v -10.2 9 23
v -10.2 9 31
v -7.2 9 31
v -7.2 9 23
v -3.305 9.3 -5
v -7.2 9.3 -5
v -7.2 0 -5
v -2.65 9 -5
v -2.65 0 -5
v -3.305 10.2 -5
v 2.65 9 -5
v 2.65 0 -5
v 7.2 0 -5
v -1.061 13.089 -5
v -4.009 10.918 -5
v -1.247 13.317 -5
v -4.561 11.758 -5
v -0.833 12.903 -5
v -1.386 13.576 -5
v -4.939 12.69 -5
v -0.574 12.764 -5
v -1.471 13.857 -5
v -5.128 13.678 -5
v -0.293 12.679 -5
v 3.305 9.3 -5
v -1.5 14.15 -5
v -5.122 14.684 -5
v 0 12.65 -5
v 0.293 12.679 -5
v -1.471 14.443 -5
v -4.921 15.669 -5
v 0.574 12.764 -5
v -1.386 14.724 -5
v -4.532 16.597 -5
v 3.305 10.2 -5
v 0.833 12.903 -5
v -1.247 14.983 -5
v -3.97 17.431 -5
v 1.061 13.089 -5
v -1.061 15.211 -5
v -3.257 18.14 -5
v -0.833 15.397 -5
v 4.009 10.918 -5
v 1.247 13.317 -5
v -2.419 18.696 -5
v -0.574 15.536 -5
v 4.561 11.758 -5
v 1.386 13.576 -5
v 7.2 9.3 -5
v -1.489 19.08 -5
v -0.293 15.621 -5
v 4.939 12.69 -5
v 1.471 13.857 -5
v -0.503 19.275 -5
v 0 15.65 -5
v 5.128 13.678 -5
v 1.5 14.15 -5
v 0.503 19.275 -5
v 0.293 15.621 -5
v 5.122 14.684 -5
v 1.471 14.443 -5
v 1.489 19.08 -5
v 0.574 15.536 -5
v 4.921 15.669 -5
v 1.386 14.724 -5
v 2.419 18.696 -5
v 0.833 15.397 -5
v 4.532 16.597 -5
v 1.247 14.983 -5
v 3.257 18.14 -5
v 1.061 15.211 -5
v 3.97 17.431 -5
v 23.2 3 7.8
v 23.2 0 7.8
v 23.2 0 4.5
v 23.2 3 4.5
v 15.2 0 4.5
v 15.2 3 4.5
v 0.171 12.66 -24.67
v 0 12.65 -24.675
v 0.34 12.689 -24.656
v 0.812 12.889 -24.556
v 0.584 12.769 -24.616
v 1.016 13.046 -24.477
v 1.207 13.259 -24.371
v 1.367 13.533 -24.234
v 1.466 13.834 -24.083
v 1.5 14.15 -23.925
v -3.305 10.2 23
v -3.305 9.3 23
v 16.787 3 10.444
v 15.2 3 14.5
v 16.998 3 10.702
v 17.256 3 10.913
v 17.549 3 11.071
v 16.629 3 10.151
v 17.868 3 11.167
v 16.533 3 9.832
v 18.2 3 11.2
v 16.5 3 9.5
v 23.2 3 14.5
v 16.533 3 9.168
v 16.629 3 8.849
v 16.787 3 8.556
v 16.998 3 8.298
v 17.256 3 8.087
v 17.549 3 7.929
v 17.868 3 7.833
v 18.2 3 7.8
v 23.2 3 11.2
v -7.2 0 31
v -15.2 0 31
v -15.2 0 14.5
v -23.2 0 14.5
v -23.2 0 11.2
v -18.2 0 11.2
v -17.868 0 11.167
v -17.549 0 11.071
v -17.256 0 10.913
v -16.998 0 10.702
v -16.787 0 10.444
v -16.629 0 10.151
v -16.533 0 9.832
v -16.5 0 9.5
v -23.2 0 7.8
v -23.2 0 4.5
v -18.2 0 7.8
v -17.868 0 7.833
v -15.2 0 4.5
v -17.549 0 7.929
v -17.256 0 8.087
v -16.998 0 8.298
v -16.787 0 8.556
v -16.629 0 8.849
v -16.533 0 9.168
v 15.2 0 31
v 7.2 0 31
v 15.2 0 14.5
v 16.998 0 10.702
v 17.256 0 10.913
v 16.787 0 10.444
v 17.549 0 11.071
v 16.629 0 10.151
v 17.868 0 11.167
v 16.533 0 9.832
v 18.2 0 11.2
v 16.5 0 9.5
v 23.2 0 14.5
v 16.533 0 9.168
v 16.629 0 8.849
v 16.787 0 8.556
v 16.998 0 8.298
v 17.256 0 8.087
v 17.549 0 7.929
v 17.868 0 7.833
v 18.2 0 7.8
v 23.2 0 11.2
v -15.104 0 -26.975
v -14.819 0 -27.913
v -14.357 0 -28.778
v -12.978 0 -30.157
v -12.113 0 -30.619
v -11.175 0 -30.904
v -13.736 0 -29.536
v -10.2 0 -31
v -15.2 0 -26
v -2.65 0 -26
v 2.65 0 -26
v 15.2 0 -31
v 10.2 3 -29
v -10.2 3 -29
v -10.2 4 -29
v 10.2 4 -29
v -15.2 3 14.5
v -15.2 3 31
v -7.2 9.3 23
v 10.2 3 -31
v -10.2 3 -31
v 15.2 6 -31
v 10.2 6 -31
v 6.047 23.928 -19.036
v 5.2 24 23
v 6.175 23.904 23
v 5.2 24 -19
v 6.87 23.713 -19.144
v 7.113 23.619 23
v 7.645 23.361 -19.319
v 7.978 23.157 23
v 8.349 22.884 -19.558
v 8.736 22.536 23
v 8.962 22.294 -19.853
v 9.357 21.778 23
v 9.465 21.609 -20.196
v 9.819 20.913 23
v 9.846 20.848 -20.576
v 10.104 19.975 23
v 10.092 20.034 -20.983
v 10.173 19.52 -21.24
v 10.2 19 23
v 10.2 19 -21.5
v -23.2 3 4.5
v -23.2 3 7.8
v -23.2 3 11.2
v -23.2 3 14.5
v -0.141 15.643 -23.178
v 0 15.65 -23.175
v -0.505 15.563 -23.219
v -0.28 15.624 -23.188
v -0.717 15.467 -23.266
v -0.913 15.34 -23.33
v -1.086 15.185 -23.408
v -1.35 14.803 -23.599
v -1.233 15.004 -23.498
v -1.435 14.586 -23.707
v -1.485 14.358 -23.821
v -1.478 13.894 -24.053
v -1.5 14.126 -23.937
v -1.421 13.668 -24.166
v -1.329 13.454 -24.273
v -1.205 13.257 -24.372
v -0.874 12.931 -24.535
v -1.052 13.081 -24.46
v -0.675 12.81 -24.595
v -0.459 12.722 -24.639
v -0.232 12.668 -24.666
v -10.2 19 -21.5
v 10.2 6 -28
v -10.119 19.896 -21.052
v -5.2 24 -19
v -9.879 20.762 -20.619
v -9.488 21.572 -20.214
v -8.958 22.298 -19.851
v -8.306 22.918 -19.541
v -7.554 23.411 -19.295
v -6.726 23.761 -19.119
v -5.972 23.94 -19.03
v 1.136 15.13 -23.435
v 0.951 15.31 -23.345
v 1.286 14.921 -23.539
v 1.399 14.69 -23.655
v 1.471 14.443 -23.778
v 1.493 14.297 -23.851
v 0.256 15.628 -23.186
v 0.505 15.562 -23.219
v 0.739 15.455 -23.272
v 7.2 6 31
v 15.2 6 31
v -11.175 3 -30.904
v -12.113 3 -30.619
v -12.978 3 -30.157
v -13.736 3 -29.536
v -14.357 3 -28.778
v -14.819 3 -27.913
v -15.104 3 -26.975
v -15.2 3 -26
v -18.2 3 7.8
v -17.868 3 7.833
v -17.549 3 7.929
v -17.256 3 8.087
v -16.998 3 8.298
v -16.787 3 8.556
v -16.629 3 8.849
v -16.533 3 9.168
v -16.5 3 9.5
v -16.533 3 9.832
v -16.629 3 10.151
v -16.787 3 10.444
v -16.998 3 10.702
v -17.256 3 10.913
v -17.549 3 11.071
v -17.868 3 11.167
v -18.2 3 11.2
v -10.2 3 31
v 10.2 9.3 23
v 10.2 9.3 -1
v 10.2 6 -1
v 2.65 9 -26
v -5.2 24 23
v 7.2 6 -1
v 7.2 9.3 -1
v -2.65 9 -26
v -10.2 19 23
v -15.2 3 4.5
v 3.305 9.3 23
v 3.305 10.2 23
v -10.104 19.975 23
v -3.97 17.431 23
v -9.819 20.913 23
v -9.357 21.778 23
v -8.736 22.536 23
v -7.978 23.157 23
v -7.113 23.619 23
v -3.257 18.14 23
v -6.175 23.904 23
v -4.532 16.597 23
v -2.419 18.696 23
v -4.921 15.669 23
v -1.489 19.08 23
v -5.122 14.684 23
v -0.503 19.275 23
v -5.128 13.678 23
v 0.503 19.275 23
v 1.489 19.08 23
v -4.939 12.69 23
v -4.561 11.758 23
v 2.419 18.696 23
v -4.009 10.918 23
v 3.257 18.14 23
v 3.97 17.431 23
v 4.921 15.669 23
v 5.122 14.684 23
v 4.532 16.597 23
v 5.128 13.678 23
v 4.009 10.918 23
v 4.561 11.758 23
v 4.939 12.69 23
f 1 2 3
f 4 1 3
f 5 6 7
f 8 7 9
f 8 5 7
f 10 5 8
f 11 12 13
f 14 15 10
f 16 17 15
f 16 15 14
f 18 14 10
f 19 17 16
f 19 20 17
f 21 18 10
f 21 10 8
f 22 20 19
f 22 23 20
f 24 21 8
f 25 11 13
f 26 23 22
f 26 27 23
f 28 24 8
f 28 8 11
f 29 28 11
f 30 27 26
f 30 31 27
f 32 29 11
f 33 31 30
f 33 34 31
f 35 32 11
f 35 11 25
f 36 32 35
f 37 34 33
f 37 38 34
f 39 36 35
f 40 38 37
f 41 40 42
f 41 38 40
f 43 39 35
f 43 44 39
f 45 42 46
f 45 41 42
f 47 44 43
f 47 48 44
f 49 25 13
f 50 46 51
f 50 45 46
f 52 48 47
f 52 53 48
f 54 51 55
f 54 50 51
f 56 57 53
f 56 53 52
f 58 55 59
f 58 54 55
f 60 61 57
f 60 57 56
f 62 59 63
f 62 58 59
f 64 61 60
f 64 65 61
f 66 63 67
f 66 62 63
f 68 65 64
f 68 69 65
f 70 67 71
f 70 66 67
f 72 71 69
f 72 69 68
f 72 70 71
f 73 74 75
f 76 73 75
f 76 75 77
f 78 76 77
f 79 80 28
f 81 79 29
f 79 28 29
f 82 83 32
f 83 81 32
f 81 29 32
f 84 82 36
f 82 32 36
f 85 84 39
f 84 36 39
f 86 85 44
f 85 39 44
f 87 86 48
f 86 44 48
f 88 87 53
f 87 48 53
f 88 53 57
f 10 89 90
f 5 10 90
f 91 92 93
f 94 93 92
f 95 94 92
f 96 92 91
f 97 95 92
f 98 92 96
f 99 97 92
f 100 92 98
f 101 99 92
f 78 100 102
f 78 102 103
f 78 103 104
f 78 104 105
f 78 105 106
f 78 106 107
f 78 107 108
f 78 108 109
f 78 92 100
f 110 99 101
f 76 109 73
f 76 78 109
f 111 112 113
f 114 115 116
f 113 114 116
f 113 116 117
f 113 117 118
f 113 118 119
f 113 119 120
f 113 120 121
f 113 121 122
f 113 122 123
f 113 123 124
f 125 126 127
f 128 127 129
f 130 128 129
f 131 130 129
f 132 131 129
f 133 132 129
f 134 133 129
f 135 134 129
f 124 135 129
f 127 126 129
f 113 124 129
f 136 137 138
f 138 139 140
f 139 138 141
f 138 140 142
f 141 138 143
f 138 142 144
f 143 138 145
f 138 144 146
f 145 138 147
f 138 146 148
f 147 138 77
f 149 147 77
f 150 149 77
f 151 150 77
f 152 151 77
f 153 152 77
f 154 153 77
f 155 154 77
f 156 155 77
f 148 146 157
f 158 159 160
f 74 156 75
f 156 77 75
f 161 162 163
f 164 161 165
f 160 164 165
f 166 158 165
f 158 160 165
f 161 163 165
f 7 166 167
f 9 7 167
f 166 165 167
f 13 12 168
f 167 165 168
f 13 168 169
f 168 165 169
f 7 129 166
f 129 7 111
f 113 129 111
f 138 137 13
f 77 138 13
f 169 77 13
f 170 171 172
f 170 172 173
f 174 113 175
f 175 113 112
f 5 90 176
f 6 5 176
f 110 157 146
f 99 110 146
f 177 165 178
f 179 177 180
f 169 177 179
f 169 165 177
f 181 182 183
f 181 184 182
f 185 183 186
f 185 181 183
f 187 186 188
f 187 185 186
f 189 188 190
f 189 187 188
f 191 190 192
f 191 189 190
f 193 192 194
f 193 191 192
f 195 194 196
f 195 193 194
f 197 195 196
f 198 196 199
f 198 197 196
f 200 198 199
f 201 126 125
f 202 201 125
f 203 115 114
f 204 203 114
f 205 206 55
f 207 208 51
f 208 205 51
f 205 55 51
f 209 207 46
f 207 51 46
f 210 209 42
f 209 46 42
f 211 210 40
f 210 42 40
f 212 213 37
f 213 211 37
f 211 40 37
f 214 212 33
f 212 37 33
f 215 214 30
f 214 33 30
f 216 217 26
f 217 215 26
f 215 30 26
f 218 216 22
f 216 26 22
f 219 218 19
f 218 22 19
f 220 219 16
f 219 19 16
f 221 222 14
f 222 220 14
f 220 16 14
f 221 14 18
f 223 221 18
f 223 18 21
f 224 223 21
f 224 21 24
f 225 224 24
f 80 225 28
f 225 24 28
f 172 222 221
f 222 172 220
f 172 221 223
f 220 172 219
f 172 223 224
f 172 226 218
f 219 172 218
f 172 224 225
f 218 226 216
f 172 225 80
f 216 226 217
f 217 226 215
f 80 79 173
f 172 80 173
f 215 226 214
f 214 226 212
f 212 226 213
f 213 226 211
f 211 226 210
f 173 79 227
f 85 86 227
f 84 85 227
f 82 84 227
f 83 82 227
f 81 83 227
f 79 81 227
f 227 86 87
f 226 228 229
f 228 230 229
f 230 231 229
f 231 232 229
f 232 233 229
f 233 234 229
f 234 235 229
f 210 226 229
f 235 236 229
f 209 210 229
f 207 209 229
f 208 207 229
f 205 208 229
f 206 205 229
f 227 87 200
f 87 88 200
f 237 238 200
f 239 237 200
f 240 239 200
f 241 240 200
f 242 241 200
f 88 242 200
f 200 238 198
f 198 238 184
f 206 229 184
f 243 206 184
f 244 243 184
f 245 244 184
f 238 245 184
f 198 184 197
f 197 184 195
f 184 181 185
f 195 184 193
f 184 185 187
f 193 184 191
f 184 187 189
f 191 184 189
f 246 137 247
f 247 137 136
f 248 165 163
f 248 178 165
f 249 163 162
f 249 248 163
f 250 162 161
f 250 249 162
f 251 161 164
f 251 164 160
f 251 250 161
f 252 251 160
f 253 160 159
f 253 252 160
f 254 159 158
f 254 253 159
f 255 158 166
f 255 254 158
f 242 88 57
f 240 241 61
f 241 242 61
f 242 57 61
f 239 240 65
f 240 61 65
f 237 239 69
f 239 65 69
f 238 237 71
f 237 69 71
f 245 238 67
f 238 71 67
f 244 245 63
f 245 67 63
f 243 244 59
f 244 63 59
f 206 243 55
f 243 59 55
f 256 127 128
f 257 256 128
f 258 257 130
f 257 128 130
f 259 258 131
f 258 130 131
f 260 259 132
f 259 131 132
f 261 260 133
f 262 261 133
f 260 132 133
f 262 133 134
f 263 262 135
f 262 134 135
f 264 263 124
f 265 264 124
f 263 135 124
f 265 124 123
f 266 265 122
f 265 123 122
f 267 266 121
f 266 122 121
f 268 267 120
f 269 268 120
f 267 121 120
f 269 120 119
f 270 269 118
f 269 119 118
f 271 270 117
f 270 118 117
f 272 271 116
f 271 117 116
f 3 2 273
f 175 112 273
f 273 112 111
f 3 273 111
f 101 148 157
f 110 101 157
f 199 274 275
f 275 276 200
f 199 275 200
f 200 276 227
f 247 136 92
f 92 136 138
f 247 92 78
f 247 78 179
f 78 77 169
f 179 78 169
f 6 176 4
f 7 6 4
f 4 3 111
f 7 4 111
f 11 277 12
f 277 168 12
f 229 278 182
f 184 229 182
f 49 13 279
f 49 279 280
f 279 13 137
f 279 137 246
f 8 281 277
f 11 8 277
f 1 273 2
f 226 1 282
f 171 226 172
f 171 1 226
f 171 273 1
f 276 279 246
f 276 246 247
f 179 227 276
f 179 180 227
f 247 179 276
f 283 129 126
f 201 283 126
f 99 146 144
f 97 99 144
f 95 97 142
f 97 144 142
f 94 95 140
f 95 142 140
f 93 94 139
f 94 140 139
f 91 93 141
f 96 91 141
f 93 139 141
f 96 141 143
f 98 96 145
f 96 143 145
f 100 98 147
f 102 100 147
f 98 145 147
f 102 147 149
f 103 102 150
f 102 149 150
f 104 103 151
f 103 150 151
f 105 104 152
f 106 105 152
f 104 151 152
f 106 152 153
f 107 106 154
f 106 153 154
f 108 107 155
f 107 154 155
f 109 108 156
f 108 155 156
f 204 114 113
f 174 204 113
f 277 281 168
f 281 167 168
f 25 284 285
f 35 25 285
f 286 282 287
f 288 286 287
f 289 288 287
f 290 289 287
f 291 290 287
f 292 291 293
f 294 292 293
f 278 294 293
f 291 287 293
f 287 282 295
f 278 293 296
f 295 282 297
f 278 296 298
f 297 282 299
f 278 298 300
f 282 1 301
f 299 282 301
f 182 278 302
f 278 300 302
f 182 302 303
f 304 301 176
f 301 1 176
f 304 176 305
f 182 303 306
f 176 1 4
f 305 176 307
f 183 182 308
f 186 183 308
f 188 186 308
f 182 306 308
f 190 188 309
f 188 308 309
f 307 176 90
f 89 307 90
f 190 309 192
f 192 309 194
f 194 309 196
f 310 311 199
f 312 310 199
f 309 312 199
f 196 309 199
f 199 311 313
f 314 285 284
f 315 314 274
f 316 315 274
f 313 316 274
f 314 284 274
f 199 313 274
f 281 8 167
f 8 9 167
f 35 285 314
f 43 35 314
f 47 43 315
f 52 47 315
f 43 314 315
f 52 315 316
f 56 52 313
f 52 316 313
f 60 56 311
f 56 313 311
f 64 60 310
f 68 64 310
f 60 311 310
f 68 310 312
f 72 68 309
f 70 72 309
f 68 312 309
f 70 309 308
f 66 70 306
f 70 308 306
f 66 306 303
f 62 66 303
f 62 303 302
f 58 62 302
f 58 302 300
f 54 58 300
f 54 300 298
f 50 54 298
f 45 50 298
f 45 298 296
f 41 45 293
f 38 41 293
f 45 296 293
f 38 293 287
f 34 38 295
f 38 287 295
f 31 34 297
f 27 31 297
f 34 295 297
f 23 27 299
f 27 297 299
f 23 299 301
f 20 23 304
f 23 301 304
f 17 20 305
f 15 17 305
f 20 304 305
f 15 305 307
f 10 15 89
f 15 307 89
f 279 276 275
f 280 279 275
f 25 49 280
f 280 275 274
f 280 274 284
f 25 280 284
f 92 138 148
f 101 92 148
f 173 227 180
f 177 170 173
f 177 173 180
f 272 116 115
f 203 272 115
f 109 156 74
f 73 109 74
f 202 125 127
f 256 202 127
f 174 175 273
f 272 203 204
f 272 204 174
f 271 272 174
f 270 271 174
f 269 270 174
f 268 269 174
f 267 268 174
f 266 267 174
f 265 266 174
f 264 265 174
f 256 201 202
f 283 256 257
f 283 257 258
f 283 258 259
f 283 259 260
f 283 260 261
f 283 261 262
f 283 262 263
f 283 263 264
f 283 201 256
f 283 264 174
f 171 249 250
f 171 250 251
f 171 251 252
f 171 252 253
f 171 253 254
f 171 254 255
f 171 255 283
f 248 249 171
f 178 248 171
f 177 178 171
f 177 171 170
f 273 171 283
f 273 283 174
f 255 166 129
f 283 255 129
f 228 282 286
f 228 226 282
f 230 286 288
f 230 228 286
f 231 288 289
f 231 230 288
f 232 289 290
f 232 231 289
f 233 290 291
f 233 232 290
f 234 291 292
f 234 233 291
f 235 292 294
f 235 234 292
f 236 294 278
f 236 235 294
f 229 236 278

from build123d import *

# Parameters (mm, degrees)
SKETCH1_W           = 4.55
SKETCH1_H           = 21
BOSS_EXTRUDE1_DEPTH = 3
FILLET1_R           = 5
BOSS_EXTRUDE2_DEPTH = 6
SKETCH9_W           = 20.4
SKETCH9_H           = 52
BOSS_EXTRUDE4_DEPTH = 15
CHAMFER4_SIZE       = 20
CHAMFER4_SIZE2      = 10
FILLET5_R           = 5
CUT_EXTRUDE6_DEPTH  = 28
CUT_EXTRUDE7_DEPTH  = 64.484171256
SKETCH16_W          = 32
SKETCH16_H          = 3.3
CUT_EXTRUDE8_DEPTH  = 3
SKETCH17_W          = 5
SKETCH17_H          = 62
BOSS_EXTRUDE5_DEPTH = 3


with BuildPart() as part:
    # Sketch1 → Boss-Extrude1 (new body)
    with BuildSketch(Plane(origin=(0, 0, 0), x_dir=(1, 0, 0), z_dir=(0, 1, 0))):
        with BuildLine():
            Line((-15.2, -14.5), (-15.2, -31))
            Line((-15.2, -31), (-7.2, -31))
            Line((-7.2, -31), (-7.2, 5))
            Line((-7.2, 5), (-7.2, 26))
            Line((-7.2, 26), (-2.65, 26))
            Line((-2.65, 26), (2.65, 26))
            Line((2.65, 26), (7.2, 26))
            Line((7.2, 26), (7.2, 5))
            Line((7.2, 5), (7.2, -31))
            Line((7.2, -31), (15.2, -31))
            Line((15.2, -31), (15.2, -14.5))
            Line((15.2, -14.5), (23.2, -14.5))
            Line((23.2, -14.5), (23.2, -11.2))
            Line((23.2, -11.2), (18.2, -11.2))
            ThreePointArc((18.2, -11.2), (16.5, -9.5), (18.2, -7.8))
            Line((18.2, -7.8), (23.2, -7.8))
            Line((23.2, -7.8), (23.2, -4.5))
            Line((23.2, -4.5), (15.2, -4.5))
            Line((15.2, -4.5), (15.2, 31))
            Line((15.2, 31), (-15.2, 31))
            Line((-15.2, 31), (-15.2, -4.5))
            Line((-15.2, -4.5), (-23.2, -4.5))
            Line((-23.2, -4.5), (-23.2, -7.8))
            Line((-23.2, -7.8), (-18.2, -7.8))
            ThreePointArc((-18.2, -7.8), (-16.5, -9.5), (-18.2, -11.2))
            Line((-18.2, -11.2), (-23.2, -11.2))
            Line((-23.2, -11.2), (-23.2, -14.5))
            Line((-23.2, -14.5), (-15.2, -14.5))
        make_face()
        with Locations((-4.925, 15.5)):
            Rectangle(SKETCH1_W, SKETCH1_H)
        with Locations((4.925, 15.5)):
            Rectangle(SKETCH1_W, SKETCH1_H)
    extrude(amount=BOSS_EXTRUDE1_DEPTH)

    # Fillet1
    fillet1_edges = [part.edges().sort_by_distance(p)[0] for p in [
        (-15.2, 1.5, -31),
    ]]
    fillet(fillet1_edges, radius=FILLET1_R)

    # Sketch3 → Boss-Extrude2 (add)
    with BuildSketch(Plane(origin=(0, 3, 0), x_dir=(1, 0, 0), z_dir=(0, 1, 0))):
        Polygon((10.2, 29), (-10.2, 29), (-10.2, -31), (-7.2, -31), (-7.2, 5), (-2.65, 5), (-2.65, 26), (2.65, 26), (2.65, 5), (7.2, 5), (7.2, -31), (10.2, -31), align=None)
    extrude(amount=BOSS_EXTRUDE2_DEPTH)

    # Sketch9 → Boss-Extrude4 (add)
    with BuildSketch(Plane(origin=(0, 9, 0), x_dir=(1, 0, 0), z_dir=(0, 1, 0))):
        with Locations((0, 3)):
            Rectangle(SKETCH9_W, SKETCH9_H)
    extrude(amount=BOSS_EXTRUDE4_DEPTH)

    # Chamfer4
    chamfer4_edges = [part.edges().sort_by_distance(p)[0] for p in [
        (0, 24, -29),
    ]]
    chamfer4_side = [part.faces().sort_by_distance(p)[0] for p in [
        (0, 13.5, -29),
    ]]
    chamfer(chamfer4_edges, length=CHAMFER4_SIZE, length2=CHAMFER4_SIZE2, reference=chamfer4_side[0])

    # Fillet5
    fillet5_edges = [part.edges().sort_by_distance(p)[0] for p in [
        (10.2, 24, 2),
        (-10.2, 24, 2),
    ]]
    fillet(fillet5_edges, radius=FILLET5_R)

    # Sketch15 → Cut-Extrude6 (cut)
    with BuildSketch(Plane.XY.offset(23)):
        with BuildLine():
            Line((7.2, 9), (7.2, 9.3))
            Line((7.2, 9.3), (3.304542328, 9.3))
            Line((3.304542328, 9.3), (3.304542328, 10.2))
            ThreePointArc((3.304542328, 10.2), (0, 19.3), (-3.304542328, 10.2))
            Line((-3.304542328, 10.2), (-3.304542328, 9.3))
            Line((-3.304542328, 9.3), (-7.2, 9.3))
            Line((-7.2, 9.3), (-7.2, 9))
            Line((-7.2, 9), (7.2, 9))
        make_face()
    extrude(amount=-CUT_EXTRUDE6_DEPTH, mode=Mode.SUBTRACT)

    # Sketch15<6> → Cut-Extrude7 (cut, through all)
    with BuildSketch(Plane.XY.offset(23)):
        with BuildLine():
            ThreePointArc((0, 15.65), (-1.5, 14.15), (0, 12.65))
            Line((0, 12.65), (0, 15.65))
        make_face()
        with BuildLine():
            Line((0, 15.65), (0, 12.65))
            ThreePointArc((0, 12.65), (1.060660172, 13.089339828), (1.5, 14.15))
            ThreePointArc((1.5, 14.15), (1.060660172, 15.210660172), (0, 15.65))
        make_face()
    extrude(amount=-CUT_EXTRUDE7_DEPTH, mode=Mode.SUBTRACT)

    # Sketch16 → Cut-Extrude8 (cut)
    with BuildSketch(Plane(origin=(10.2, 0, 0), x_dir=(0, 0, -1), z_dir=(1, 0, 0))):
        with Locations((-15, 7.65)):
            Rectangle(SKETCH16_W, SKETCH16_H)
    extrude(amount=-CUT_EXTRUDE8_DEPTH, mode=Mode.SUBTRACT)

    # Sketch17 → Boss-Extrude5 (add)
    with BuildSketch(Plane(origin=(0, 3, 0), x_dir=(1, 0, 0), z_dir=(0, 1, 0))):
        with Locations((12.7, 0)):
            Rectangle(SKETCH17_W, SKETCH17_H)
    extrude(amount=BOSS_EXTRUDE5_DEPTH)


solid = part.part
